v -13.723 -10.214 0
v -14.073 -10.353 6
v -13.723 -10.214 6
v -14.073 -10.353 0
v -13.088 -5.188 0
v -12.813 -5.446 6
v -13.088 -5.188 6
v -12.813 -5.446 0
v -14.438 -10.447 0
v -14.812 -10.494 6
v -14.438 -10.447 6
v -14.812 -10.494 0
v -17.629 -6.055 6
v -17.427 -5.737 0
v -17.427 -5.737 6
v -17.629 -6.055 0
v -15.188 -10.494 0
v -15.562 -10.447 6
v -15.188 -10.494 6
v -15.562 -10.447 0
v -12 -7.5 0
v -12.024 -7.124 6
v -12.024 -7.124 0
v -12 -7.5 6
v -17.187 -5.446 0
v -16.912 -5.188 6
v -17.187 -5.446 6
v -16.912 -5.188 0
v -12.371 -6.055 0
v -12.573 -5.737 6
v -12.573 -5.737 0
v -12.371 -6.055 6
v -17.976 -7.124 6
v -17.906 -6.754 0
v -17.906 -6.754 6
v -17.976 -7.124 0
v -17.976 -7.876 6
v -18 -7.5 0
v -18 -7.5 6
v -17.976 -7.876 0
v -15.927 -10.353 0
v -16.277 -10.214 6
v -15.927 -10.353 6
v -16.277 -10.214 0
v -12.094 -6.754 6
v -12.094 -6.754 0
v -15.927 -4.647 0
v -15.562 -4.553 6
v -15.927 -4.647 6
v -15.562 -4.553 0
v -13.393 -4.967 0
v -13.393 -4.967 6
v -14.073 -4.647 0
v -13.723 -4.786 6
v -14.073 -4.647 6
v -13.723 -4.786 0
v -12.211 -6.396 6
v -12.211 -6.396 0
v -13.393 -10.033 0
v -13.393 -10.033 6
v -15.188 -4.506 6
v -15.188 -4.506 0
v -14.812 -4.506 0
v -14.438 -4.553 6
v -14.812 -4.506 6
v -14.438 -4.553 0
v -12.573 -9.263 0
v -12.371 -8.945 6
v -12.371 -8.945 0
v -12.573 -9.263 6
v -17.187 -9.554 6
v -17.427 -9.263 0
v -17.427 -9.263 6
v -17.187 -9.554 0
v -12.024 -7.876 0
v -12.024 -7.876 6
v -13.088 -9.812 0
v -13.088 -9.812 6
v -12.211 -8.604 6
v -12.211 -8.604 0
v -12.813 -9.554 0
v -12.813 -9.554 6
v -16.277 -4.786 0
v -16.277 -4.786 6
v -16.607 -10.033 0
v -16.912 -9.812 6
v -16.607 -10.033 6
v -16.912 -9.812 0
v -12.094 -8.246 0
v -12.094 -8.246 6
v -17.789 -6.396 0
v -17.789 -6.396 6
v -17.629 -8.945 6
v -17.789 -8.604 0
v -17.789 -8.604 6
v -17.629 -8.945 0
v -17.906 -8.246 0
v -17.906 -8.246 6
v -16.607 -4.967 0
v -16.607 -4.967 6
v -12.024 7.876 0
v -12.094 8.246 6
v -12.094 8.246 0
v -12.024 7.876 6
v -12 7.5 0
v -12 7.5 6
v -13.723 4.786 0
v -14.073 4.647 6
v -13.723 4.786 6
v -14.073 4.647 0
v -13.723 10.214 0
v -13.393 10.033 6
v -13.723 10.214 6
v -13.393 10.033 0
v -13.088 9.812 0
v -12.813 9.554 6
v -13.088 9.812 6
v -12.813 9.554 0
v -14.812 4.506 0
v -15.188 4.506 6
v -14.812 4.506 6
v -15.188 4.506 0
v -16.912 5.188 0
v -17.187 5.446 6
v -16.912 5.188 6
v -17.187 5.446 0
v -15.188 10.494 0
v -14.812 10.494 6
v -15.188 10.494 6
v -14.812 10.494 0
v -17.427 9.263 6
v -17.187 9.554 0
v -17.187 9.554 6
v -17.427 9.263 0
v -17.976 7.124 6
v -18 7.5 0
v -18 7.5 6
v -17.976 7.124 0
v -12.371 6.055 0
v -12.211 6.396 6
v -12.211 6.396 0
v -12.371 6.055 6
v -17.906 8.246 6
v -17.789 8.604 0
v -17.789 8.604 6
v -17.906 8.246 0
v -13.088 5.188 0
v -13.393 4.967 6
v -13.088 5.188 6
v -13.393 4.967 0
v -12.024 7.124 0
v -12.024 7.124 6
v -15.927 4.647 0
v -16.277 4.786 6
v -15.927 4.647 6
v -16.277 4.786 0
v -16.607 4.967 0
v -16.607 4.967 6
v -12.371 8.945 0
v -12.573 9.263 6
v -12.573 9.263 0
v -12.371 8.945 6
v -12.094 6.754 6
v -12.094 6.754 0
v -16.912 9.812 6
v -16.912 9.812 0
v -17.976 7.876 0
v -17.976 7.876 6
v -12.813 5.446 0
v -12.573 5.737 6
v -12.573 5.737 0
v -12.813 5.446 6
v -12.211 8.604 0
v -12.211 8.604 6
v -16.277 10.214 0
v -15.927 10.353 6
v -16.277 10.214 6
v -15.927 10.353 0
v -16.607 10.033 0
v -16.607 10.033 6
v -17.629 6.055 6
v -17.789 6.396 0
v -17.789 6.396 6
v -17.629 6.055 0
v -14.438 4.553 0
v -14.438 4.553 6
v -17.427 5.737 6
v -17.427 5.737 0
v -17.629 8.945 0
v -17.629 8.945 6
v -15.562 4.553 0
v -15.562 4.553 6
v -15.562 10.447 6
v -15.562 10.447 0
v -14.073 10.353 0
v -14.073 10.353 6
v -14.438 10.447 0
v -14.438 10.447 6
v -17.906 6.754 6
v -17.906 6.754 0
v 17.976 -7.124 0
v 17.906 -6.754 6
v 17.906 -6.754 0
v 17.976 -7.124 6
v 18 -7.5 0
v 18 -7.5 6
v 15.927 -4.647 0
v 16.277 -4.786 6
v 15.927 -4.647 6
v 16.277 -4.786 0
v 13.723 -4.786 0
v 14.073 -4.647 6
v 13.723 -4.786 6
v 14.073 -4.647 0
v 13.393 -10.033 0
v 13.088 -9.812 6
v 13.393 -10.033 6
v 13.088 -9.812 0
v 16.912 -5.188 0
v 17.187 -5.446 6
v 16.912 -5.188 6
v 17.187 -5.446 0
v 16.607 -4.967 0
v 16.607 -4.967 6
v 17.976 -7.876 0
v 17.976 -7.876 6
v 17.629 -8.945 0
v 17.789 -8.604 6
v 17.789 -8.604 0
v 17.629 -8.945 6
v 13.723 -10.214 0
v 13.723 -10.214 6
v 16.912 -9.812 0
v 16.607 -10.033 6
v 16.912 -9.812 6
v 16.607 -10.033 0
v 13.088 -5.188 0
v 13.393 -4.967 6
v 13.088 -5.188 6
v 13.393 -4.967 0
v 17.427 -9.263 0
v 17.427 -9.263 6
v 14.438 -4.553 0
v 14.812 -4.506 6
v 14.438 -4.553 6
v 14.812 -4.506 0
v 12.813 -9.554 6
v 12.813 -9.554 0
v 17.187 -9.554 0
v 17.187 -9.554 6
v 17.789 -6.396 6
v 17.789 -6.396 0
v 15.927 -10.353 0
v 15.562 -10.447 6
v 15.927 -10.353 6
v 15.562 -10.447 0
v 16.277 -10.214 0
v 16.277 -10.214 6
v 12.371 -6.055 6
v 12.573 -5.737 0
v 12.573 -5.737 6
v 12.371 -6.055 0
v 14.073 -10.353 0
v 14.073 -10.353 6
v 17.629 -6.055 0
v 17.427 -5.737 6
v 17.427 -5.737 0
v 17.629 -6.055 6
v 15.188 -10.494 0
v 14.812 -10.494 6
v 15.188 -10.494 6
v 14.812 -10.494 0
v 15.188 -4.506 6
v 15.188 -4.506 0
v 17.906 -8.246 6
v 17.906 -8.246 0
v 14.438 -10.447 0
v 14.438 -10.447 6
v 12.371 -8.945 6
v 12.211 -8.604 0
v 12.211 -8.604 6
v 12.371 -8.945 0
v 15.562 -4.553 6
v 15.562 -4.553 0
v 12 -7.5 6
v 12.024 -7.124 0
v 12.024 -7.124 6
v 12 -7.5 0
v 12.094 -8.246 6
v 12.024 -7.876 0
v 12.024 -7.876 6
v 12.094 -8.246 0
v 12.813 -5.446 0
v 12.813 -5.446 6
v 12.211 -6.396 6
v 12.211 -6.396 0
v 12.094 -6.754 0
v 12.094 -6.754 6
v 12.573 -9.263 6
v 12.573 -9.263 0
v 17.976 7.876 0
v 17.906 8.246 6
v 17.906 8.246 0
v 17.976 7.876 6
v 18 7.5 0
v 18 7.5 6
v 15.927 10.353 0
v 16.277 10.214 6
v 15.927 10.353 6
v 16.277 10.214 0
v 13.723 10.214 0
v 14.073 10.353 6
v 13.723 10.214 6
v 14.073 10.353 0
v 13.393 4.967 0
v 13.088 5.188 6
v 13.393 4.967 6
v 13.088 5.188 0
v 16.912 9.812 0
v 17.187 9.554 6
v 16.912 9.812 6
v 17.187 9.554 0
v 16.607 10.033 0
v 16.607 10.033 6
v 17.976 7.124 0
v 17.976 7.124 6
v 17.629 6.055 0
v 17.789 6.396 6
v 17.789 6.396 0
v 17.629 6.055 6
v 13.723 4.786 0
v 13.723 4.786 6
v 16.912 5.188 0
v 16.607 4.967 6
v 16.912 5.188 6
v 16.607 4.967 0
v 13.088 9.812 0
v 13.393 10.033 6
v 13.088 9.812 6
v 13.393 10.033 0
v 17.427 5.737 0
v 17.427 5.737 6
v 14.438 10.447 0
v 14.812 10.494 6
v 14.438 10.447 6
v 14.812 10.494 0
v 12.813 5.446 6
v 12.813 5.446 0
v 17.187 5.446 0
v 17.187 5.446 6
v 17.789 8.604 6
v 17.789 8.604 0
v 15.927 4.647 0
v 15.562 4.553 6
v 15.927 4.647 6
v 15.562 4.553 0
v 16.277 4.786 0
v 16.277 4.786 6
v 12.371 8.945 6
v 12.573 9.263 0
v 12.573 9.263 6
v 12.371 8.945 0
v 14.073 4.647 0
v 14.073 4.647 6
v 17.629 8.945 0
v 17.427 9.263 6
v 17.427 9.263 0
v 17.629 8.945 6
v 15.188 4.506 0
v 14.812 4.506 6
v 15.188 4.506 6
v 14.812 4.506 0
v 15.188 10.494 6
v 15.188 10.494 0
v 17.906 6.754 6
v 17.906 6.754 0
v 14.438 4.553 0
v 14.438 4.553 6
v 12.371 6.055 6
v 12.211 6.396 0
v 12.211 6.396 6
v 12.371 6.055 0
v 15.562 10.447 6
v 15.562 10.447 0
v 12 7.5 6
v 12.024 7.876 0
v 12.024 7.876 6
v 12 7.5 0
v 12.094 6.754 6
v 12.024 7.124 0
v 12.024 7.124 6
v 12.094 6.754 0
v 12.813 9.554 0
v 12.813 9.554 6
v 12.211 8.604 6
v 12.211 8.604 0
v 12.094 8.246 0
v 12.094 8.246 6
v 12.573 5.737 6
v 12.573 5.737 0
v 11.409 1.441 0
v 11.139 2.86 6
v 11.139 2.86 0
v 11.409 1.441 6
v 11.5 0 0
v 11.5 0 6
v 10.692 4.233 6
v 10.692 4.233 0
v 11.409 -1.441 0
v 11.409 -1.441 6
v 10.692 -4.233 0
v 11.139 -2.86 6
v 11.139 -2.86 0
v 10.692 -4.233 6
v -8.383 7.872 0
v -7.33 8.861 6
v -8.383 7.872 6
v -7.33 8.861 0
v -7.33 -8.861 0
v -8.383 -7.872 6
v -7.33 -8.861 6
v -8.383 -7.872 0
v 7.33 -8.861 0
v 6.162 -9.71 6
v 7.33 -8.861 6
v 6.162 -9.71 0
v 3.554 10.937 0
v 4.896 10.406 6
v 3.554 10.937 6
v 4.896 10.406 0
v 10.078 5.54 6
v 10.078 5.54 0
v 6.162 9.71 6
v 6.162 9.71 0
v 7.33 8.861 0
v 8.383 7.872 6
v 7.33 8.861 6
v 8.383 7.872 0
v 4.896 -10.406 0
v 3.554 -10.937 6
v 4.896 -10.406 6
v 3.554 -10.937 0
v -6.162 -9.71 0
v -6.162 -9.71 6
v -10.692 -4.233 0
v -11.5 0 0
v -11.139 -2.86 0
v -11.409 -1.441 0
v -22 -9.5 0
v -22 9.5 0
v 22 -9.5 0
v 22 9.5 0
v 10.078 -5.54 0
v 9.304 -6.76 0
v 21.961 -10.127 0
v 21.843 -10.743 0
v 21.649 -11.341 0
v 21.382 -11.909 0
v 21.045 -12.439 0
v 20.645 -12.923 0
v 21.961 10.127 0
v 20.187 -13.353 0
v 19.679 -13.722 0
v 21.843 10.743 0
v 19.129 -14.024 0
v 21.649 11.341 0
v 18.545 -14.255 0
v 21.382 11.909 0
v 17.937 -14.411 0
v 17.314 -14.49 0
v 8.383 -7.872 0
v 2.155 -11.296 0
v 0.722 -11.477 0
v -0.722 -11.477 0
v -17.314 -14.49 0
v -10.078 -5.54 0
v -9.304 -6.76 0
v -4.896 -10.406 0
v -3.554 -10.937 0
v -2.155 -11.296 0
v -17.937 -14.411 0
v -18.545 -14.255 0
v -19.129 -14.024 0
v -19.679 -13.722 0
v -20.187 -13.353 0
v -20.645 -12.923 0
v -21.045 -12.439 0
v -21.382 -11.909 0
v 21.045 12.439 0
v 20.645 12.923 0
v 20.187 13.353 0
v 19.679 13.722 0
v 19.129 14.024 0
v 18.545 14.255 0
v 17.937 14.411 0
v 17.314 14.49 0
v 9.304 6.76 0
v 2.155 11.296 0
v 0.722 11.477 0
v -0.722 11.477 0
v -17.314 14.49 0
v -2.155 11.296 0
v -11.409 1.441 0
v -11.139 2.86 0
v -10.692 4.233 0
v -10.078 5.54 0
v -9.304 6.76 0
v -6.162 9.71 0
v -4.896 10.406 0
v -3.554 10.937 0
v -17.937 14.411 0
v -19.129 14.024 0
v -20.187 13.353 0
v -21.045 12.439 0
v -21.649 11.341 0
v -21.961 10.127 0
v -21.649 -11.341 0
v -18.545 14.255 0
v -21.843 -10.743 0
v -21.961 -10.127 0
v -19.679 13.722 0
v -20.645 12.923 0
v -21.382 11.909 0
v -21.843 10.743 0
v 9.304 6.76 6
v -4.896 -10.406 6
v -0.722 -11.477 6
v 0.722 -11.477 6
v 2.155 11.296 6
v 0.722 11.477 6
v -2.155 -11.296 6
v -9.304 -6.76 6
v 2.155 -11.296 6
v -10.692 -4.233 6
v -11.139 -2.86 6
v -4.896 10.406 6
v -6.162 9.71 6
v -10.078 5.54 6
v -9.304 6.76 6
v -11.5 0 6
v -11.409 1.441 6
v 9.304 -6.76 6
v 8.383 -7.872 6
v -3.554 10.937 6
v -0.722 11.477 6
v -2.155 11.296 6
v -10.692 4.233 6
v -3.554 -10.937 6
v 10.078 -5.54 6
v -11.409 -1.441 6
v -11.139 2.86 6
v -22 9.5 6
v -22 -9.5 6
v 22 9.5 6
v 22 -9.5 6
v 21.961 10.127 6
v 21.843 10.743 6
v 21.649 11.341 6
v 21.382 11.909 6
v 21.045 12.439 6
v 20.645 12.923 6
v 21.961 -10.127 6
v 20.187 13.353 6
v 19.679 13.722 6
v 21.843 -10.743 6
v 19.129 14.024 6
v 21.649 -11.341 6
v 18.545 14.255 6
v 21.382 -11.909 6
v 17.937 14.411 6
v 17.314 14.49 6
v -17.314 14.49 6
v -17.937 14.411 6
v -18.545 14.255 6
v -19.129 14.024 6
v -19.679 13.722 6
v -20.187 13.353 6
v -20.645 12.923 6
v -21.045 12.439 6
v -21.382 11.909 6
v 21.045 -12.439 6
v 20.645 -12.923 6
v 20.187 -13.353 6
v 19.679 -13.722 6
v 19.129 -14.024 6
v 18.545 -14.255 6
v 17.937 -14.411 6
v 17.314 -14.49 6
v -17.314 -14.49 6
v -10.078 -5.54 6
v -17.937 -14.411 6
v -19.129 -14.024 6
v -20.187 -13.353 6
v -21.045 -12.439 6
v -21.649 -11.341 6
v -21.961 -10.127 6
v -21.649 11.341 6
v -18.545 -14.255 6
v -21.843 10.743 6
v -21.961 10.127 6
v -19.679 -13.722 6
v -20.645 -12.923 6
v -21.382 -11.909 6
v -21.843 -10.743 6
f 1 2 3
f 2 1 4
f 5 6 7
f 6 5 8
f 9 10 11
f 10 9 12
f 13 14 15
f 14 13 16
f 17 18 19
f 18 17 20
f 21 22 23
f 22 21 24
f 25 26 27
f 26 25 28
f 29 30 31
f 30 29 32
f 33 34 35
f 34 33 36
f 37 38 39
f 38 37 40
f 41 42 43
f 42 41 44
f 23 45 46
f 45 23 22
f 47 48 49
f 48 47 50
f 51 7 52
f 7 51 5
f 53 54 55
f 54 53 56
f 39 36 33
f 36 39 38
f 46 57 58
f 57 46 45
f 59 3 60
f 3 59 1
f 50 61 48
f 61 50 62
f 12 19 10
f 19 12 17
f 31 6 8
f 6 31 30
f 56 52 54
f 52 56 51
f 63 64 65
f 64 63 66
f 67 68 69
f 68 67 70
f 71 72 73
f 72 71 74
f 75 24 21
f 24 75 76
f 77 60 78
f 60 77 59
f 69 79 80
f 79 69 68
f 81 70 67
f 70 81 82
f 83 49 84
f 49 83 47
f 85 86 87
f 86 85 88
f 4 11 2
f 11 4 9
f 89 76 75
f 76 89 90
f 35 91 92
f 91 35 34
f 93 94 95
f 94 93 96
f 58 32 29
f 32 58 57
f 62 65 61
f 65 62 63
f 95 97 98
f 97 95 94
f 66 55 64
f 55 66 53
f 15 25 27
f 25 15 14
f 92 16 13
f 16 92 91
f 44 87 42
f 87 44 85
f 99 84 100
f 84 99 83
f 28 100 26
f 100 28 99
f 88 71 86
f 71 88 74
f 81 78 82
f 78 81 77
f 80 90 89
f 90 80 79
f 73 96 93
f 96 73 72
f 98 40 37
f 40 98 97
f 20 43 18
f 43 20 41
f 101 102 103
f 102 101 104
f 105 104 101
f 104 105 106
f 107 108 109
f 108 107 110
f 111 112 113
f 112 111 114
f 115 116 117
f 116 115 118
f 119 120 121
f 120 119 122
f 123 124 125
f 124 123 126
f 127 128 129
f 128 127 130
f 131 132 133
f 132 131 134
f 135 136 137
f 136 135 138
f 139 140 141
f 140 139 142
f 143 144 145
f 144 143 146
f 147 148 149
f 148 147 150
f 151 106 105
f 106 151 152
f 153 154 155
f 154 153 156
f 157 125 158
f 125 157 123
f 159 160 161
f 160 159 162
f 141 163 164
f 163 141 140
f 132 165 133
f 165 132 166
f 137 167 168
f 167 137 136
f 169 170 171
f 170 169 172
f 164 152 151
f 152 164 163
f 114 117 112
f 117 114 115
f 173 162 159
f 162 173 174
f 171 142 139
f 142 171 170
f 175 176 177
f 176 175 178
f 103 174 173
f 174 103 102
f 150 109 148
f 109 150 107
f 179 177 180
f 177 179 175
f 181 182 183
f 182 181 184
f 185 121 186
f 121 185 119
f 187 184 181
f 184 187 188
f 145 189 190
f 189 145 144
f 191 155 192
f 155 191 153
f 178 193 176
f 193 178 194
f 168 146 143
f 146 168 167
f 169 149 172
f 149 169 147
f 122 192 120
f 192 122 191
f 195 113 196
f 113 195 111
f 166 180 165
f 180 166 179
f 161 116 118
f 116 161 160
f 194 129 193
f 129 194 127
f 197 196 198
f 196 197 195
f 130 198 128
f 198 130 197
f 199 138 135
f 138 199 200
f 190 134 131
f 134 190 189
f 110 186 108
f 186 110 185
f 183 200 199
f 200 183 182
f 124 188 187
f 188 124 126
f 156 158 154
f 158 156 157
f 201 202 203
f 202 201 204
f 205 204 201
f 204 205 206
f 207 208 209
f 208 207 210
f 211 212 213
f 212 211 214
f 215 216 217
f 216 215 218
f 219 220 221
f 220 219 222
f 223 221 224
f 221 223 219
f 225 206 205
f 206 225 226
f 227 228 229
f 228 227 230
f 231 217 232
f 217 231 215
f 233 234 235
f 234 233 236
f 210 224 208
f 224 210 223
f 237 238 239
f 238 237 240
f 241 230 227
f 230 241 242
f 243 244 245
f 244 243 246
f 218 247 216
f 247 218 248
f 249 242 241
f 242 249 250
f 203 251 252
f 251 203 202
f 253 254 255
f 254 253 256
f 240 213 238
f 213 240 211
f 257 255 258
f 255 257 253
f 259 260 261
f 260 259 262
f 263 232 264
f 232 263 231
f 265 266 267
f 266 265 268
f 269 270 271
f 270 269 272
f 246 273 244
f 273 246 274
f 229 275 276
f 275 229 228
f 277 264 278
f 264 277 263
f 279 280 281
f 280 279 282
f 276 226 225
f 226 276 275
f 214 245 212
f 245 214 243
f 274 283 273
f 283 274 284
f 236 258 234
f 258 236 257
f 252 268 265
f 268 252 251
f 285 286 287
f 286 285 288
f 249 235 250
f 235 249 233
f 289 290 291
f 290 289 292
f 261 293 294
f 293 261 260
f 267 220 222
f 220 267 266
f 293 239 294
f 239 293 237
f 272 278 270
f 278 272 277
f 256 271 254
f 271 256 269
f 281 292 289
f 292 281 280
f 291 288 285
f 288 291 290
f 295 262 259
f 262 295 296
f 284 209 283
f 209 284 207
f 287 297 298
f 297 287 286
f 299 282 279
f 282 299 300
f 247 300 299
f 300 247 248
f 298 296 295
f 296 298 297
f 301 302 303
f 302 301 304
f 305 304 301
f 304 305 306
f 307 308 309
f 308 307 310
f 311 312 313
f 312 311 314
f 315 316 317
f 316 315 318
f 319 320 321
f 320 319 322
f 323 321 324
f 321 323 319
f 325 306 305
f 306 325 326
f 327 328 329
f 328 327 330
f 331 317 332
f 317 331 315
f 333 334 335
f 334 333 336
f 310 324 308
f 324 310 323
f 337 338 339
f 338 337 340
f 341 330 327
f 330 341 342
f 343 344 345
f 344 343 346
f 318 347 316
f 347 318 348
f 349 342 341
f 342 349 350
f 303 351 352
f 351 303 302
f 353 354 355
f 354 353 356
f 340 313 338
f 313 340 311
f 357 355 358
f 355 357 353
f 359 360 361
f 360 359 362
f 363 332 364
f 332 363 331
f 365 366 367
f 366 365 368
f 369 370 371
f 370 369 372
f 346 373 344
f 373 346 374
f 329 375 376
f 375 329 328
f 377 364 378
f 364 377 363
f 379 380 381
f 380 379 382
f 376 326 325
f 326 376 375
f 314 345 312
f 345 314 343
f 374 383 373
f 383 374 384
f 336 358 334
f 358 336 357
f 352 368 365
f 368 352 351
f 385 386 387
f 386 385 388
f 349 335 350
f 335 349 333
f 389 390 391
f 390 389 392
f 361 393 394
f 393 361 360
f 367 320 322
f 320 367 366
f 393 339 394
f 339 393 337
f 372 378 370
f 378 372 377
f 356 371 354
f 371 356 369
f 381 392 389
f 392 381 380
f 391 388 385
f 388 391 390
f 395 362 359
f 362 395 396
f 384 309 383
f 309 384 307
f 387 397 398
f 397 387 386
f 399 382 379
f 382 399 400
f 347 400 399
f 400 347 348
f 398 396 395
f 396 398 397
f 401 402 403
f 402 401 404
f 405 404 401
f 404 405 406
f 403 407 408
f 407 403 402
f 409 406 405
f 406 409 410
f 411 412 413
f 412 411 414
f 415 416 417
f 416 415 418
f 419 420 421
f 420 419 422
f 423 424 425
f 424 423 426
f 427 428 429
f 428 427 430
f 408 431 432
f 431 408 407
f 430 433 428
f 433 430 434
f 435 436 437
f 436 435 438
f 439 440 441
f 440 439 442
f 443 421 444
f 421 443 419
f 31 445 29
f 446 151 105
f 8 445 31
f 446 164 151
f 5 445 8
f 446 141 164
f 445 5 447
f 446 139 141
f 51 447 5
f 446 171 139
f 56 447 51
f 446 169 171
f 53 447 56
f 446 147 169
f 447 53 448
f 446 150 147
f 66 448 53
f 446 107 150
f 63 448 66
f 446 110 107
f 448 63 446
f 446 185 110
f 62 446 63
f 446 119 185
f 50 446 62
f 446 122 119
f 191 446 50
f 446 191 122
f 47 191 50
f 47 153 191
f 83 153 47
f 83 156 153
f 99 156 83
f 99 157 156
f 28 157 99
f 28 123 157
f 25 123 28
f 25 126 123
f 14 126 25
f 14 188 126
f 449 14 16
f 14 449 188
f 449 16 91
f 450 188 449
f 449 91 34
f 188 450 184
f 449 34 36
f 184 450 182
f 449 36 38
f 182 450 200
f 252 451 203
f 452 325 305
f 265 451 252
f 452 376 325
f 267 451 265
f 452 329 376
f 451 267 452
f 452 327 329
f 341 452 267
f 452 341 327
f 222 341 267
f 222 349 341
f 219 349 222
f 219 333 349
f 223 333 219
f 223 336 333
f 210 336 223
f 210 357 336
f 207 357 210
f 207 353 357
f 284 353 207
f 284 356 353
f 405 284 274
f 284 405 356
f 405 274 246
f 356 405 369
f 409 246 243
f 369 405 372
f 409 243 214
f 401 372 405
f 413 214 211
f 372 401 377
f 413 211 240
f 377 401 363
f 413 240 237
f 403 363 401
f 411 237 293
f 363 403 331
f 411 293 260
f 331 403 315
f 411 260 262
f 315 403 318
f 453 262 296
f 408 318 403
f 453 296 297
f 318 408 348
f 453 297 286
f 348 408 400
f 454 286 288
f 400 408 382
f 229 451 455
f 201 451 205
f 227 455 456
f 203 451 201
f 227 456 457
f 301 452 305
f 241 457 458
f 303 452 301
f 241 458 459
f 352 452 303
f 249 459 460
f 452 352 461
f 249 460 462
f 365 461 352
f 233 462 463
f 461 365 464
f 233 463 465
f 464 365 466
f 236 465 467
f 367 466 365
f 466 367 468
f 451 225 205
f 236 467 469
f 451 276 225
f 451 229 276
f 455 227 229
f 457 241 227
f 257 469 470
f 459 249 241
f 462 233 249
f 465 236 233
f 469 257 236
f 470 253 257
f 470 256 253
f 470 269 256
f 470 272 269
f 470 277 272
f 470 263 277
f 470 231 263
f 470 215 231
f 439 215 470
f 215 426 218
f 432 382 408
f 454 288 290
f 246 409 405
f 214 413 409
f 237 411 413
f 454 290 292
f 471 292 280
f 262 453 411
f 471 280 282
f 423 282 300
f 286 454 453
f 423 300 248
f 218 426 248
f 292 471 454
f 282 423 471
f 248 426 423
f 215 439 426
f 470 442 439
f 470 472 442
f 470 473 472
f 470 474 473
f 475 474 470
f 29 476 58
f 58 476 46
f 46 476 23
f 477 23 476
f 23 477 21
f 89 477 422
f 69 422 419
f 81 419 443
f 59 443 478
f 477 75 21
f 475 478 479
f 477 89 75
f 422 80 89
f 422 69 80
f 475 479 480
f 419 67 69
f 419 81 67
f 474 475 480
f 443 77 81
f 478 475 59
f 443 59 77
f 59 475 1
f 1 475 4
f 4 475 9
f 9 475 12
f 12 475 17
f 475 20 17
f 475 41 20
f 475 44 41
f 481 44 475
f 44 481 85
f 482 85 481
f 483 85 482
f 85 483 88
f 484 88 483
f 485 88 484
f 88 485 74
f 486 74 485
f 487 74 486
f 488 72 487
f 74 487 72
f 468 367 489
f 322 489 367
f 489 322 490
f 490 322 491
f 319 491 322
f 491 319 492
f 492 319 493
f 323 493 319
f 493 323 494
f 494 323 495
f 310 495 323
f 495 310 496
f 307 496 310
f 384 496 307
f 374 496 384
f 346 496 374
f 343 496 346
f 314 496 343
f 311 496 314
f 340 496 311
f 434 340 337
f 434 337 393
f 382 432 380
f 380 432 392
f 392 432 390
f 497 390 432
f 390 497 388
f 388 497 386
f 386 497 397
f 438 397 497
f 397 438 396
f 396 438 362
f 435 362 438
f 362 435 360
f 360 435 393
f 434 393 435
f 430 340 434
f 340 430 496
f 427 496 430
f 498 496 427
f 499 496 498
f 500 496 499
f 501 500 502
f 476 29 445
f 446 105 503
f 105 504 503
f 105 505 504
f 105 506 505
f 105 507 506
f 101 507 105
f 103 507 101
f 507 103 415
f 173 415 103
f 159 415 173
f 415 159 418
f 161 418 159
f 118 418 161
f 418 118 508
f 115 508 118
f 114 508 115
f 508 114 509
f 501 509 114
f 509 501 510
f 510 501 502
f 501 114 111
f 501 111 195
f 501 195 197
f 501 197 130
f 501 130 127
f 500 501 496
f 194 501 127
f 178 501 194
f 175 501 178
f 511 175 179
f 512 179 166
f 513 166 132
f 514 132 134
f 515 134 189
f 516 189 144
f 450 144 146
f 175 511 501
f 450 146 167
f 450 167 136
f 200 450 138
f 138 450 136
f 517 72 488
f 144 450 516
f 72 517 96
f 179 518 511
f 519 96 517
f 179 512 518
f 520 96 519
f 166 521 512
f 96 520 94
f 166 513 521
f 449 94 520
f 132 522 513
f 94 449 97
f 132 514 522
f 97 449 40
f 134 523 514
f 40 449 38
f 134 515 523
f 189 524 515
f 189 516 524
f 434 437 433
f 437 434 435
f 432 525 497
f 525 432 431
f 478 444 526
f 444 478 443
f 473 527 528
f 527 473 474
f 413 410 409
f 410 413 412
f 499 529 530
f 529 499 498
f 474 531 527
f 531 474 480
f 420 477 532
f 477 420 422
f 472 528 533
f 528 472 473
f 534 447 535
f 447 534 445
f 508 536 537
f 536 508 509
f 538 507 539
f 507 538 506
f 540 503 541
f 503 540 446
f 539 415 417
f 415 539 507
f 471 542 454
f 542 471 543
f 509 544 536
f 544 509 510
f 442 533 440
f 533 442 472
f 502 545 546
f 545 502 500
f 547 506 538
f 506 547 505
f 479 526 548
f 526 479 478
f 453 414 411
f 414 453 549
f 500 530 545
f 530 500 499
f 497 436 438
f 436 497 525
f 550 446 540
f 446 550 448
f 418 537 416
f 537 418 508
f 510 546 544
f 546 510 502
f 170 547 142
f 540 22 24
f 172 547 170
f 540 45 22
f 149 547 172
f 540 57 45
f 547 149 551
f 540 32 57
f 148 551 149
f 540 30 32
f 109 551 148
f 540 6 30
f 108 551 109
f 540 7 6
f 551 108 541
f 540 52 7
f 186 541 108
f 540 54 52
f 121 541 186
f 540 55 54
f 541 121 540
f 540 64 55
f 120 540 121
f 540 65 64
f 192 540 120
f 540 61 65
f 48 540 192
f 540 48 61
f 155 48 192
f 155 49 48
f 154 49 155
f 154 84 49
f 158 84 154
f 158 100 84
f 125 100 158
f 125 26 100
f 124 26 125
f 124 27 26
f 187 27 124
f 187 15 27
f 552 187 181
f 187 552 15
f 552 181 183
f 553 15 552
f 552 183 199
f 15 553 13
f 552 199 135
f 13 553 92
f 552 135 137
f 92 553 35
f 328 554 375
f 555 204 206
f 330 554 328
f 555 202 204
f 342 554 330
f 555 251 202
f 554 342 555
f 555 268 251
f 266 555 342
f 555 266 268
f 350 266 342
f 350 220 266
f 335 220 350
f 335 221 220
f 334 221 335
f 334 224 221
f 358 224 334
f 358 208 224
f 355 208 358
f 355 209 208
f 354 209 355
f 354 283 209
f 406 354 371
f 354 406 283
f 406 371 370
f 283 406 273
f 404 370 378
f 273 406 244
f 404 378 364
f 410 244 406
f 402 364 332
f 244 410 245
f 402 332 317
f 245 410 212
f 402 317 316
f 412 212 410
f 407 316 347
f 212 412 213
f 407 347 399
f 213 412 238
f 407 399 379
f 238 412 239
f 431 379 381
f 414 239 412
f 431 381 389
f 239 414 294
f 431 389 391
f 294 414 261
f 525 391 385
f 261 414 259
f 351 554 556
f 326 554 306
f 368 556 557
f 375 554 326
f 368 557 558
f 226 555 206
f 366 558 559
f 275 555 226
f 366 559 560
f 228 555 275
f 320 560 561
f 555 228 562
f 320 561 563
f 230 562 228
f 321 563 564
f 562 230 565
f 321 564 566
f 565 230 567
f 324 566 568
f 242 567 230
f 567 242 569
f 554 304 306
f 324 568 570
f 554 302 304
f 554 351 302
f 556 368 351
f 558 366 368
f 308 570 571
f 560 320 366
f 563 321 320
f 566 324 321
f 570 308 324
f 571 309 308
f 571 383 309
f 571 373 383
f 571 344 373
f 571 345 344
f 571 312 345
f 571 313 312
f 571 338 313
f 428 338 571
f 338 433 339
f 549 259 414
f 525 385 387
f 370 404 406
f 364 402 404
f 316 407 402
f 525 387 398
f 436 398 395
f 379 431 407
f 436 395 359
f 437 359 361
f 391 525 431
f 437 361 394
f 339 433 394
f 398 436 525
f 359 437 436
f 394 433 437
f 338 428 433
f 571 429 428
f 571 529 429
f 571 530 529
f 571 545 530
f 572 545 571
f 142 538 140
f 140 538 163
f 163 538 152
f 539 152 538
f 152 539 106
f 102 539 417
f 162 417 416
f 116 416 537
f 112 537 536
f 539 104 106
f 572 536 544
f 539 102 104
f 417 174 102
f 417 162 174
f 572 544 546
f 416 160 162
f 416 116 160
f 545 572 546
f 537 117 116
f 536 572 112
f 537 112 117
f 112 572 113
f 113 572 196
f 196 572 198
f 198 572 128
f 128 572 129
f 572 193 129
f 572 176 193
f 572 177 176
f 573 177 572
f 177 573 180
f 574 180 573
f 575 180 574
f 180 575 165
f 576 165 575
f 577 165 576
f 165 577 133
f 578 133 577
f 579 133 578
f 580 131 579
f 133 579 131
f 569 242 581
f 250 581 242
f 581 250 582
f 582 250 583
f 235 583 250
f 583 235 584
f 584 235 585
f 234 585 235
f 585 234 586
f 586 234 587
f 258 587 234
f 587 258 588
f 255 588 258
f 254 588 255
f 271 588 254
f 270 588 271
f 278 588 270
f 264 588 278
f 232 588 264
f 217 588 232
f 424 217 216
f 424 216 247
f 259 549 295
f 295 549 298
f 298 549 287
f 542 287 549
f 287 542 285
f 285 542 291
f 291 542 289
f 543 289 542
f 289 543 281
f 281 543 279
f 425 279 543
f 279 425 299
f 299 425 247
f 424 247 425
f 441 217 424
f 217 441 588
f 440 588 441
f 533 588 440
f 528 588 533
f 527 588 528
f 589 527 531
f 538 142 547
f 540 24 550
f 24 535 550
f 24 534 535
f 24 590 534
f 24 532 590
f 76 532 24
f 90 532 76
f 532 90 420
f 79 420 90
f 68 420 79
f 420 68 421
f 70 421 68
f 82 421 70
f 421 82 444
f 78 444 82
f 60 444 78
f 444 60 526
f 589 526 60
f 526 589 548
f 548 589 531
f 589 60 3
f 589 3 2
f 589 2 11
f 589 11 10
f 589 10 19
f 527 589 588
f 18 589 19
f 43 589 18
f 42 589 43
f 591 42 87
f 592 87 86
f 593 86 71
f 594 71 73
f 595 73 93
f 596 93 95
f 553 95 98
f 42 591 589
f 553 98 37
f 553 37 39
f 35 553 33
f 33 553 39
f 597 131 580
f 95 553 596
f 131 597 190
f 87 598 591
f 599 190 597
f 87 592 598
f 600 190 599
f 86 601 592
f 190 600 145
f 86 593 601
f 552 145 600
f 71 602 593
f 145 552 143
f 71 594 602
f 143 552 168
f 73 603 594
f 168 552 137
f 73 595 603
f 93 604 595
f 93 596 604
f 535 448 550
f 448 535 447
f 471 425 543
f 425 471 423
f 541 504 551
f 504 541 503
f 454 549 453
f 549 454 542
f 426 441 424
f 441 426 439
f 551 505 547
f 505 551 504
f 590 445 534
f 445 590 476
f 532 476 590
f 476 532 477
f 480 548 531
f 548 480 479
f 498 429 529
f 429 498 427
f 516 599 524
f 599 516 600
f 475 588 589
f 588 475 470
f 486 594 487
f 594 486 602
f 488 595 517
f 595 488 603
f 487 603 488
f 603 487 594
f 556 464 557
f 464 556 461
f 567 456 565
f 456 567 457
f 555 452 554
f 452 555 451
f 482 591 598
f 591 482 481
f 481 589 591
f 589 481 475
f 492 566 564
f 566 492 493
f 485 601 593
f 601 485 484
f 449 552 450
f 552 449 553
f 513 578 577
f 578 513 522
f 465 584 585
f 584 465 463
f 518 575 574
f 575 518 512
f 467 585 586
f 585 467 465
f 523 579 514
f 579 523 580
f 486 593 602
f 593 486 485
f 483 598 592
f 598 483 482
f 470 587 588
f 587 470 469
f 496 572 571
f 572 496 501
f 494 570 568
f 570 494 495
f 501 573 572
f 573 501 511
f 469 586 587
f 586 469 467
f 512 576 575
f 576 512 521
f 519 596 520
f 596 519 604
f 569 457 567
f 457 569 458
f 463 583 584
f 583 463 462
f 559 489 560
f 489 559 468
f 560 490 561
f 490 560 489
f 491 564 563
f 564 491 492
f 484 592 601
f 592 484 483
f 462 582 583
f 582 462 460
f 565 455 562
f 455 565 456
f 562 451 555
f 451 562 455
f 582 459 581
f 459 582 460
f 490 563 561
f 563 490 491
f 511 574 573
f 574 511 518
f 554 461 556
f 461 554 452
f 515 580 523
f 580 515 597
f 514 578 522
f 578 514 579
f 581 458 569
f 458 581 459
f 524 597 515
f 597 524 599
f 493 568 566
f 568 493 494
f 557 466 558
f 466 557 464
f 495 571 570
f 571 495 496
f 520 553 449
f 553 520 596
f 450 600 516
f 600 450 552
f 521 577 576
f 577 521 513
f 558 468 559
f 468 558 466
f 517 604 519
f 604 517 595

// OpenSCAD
$fn = 50;


difference() {
	union() {
		hull() {
			translate(v = [-17.0000000000, 9.5000000000, 0]) {
				cylinder(h = 6, r = 5);
			}
			translate(v = [17.0000000000, 9.5000000000, 0]) {
				cylinder(h = 6, r = 5);
			}
			translate(v = [-17.0000000000, -9.5000000000, 0]) {
				cylinder(h = 6, r = 5);
			}
			translate(v = [17.0000000000, -9.5000000000, 0]) {
				cylinder(h = 6, r = 5);
			}
		}
	}
	union() {
		#translate(v = [-15.0000000000, -7.5000000000, -100.0000000000]) {
			cylinder(h = 200, r = 3.0000000000);
		}
		#translate(v = [-15.0000000000, 7.5000000000, -100.0000000000]) {
			cylinder(h = 200, r = 3.0000000000);
		}
		#translate(v = [15.0000000000, -7.5000000000, -100.0000000000]) {
			cylinder(h = 200, r = 3.0000000000);
		}
		#translate(v = [15.0000000000, 7.5000000000, -100.0000000000]) {
			cylinder(h = 200, r = 3.0000000000);
		}
		#cylinder(h = 6, r = 11.5000000000);
	}
}
